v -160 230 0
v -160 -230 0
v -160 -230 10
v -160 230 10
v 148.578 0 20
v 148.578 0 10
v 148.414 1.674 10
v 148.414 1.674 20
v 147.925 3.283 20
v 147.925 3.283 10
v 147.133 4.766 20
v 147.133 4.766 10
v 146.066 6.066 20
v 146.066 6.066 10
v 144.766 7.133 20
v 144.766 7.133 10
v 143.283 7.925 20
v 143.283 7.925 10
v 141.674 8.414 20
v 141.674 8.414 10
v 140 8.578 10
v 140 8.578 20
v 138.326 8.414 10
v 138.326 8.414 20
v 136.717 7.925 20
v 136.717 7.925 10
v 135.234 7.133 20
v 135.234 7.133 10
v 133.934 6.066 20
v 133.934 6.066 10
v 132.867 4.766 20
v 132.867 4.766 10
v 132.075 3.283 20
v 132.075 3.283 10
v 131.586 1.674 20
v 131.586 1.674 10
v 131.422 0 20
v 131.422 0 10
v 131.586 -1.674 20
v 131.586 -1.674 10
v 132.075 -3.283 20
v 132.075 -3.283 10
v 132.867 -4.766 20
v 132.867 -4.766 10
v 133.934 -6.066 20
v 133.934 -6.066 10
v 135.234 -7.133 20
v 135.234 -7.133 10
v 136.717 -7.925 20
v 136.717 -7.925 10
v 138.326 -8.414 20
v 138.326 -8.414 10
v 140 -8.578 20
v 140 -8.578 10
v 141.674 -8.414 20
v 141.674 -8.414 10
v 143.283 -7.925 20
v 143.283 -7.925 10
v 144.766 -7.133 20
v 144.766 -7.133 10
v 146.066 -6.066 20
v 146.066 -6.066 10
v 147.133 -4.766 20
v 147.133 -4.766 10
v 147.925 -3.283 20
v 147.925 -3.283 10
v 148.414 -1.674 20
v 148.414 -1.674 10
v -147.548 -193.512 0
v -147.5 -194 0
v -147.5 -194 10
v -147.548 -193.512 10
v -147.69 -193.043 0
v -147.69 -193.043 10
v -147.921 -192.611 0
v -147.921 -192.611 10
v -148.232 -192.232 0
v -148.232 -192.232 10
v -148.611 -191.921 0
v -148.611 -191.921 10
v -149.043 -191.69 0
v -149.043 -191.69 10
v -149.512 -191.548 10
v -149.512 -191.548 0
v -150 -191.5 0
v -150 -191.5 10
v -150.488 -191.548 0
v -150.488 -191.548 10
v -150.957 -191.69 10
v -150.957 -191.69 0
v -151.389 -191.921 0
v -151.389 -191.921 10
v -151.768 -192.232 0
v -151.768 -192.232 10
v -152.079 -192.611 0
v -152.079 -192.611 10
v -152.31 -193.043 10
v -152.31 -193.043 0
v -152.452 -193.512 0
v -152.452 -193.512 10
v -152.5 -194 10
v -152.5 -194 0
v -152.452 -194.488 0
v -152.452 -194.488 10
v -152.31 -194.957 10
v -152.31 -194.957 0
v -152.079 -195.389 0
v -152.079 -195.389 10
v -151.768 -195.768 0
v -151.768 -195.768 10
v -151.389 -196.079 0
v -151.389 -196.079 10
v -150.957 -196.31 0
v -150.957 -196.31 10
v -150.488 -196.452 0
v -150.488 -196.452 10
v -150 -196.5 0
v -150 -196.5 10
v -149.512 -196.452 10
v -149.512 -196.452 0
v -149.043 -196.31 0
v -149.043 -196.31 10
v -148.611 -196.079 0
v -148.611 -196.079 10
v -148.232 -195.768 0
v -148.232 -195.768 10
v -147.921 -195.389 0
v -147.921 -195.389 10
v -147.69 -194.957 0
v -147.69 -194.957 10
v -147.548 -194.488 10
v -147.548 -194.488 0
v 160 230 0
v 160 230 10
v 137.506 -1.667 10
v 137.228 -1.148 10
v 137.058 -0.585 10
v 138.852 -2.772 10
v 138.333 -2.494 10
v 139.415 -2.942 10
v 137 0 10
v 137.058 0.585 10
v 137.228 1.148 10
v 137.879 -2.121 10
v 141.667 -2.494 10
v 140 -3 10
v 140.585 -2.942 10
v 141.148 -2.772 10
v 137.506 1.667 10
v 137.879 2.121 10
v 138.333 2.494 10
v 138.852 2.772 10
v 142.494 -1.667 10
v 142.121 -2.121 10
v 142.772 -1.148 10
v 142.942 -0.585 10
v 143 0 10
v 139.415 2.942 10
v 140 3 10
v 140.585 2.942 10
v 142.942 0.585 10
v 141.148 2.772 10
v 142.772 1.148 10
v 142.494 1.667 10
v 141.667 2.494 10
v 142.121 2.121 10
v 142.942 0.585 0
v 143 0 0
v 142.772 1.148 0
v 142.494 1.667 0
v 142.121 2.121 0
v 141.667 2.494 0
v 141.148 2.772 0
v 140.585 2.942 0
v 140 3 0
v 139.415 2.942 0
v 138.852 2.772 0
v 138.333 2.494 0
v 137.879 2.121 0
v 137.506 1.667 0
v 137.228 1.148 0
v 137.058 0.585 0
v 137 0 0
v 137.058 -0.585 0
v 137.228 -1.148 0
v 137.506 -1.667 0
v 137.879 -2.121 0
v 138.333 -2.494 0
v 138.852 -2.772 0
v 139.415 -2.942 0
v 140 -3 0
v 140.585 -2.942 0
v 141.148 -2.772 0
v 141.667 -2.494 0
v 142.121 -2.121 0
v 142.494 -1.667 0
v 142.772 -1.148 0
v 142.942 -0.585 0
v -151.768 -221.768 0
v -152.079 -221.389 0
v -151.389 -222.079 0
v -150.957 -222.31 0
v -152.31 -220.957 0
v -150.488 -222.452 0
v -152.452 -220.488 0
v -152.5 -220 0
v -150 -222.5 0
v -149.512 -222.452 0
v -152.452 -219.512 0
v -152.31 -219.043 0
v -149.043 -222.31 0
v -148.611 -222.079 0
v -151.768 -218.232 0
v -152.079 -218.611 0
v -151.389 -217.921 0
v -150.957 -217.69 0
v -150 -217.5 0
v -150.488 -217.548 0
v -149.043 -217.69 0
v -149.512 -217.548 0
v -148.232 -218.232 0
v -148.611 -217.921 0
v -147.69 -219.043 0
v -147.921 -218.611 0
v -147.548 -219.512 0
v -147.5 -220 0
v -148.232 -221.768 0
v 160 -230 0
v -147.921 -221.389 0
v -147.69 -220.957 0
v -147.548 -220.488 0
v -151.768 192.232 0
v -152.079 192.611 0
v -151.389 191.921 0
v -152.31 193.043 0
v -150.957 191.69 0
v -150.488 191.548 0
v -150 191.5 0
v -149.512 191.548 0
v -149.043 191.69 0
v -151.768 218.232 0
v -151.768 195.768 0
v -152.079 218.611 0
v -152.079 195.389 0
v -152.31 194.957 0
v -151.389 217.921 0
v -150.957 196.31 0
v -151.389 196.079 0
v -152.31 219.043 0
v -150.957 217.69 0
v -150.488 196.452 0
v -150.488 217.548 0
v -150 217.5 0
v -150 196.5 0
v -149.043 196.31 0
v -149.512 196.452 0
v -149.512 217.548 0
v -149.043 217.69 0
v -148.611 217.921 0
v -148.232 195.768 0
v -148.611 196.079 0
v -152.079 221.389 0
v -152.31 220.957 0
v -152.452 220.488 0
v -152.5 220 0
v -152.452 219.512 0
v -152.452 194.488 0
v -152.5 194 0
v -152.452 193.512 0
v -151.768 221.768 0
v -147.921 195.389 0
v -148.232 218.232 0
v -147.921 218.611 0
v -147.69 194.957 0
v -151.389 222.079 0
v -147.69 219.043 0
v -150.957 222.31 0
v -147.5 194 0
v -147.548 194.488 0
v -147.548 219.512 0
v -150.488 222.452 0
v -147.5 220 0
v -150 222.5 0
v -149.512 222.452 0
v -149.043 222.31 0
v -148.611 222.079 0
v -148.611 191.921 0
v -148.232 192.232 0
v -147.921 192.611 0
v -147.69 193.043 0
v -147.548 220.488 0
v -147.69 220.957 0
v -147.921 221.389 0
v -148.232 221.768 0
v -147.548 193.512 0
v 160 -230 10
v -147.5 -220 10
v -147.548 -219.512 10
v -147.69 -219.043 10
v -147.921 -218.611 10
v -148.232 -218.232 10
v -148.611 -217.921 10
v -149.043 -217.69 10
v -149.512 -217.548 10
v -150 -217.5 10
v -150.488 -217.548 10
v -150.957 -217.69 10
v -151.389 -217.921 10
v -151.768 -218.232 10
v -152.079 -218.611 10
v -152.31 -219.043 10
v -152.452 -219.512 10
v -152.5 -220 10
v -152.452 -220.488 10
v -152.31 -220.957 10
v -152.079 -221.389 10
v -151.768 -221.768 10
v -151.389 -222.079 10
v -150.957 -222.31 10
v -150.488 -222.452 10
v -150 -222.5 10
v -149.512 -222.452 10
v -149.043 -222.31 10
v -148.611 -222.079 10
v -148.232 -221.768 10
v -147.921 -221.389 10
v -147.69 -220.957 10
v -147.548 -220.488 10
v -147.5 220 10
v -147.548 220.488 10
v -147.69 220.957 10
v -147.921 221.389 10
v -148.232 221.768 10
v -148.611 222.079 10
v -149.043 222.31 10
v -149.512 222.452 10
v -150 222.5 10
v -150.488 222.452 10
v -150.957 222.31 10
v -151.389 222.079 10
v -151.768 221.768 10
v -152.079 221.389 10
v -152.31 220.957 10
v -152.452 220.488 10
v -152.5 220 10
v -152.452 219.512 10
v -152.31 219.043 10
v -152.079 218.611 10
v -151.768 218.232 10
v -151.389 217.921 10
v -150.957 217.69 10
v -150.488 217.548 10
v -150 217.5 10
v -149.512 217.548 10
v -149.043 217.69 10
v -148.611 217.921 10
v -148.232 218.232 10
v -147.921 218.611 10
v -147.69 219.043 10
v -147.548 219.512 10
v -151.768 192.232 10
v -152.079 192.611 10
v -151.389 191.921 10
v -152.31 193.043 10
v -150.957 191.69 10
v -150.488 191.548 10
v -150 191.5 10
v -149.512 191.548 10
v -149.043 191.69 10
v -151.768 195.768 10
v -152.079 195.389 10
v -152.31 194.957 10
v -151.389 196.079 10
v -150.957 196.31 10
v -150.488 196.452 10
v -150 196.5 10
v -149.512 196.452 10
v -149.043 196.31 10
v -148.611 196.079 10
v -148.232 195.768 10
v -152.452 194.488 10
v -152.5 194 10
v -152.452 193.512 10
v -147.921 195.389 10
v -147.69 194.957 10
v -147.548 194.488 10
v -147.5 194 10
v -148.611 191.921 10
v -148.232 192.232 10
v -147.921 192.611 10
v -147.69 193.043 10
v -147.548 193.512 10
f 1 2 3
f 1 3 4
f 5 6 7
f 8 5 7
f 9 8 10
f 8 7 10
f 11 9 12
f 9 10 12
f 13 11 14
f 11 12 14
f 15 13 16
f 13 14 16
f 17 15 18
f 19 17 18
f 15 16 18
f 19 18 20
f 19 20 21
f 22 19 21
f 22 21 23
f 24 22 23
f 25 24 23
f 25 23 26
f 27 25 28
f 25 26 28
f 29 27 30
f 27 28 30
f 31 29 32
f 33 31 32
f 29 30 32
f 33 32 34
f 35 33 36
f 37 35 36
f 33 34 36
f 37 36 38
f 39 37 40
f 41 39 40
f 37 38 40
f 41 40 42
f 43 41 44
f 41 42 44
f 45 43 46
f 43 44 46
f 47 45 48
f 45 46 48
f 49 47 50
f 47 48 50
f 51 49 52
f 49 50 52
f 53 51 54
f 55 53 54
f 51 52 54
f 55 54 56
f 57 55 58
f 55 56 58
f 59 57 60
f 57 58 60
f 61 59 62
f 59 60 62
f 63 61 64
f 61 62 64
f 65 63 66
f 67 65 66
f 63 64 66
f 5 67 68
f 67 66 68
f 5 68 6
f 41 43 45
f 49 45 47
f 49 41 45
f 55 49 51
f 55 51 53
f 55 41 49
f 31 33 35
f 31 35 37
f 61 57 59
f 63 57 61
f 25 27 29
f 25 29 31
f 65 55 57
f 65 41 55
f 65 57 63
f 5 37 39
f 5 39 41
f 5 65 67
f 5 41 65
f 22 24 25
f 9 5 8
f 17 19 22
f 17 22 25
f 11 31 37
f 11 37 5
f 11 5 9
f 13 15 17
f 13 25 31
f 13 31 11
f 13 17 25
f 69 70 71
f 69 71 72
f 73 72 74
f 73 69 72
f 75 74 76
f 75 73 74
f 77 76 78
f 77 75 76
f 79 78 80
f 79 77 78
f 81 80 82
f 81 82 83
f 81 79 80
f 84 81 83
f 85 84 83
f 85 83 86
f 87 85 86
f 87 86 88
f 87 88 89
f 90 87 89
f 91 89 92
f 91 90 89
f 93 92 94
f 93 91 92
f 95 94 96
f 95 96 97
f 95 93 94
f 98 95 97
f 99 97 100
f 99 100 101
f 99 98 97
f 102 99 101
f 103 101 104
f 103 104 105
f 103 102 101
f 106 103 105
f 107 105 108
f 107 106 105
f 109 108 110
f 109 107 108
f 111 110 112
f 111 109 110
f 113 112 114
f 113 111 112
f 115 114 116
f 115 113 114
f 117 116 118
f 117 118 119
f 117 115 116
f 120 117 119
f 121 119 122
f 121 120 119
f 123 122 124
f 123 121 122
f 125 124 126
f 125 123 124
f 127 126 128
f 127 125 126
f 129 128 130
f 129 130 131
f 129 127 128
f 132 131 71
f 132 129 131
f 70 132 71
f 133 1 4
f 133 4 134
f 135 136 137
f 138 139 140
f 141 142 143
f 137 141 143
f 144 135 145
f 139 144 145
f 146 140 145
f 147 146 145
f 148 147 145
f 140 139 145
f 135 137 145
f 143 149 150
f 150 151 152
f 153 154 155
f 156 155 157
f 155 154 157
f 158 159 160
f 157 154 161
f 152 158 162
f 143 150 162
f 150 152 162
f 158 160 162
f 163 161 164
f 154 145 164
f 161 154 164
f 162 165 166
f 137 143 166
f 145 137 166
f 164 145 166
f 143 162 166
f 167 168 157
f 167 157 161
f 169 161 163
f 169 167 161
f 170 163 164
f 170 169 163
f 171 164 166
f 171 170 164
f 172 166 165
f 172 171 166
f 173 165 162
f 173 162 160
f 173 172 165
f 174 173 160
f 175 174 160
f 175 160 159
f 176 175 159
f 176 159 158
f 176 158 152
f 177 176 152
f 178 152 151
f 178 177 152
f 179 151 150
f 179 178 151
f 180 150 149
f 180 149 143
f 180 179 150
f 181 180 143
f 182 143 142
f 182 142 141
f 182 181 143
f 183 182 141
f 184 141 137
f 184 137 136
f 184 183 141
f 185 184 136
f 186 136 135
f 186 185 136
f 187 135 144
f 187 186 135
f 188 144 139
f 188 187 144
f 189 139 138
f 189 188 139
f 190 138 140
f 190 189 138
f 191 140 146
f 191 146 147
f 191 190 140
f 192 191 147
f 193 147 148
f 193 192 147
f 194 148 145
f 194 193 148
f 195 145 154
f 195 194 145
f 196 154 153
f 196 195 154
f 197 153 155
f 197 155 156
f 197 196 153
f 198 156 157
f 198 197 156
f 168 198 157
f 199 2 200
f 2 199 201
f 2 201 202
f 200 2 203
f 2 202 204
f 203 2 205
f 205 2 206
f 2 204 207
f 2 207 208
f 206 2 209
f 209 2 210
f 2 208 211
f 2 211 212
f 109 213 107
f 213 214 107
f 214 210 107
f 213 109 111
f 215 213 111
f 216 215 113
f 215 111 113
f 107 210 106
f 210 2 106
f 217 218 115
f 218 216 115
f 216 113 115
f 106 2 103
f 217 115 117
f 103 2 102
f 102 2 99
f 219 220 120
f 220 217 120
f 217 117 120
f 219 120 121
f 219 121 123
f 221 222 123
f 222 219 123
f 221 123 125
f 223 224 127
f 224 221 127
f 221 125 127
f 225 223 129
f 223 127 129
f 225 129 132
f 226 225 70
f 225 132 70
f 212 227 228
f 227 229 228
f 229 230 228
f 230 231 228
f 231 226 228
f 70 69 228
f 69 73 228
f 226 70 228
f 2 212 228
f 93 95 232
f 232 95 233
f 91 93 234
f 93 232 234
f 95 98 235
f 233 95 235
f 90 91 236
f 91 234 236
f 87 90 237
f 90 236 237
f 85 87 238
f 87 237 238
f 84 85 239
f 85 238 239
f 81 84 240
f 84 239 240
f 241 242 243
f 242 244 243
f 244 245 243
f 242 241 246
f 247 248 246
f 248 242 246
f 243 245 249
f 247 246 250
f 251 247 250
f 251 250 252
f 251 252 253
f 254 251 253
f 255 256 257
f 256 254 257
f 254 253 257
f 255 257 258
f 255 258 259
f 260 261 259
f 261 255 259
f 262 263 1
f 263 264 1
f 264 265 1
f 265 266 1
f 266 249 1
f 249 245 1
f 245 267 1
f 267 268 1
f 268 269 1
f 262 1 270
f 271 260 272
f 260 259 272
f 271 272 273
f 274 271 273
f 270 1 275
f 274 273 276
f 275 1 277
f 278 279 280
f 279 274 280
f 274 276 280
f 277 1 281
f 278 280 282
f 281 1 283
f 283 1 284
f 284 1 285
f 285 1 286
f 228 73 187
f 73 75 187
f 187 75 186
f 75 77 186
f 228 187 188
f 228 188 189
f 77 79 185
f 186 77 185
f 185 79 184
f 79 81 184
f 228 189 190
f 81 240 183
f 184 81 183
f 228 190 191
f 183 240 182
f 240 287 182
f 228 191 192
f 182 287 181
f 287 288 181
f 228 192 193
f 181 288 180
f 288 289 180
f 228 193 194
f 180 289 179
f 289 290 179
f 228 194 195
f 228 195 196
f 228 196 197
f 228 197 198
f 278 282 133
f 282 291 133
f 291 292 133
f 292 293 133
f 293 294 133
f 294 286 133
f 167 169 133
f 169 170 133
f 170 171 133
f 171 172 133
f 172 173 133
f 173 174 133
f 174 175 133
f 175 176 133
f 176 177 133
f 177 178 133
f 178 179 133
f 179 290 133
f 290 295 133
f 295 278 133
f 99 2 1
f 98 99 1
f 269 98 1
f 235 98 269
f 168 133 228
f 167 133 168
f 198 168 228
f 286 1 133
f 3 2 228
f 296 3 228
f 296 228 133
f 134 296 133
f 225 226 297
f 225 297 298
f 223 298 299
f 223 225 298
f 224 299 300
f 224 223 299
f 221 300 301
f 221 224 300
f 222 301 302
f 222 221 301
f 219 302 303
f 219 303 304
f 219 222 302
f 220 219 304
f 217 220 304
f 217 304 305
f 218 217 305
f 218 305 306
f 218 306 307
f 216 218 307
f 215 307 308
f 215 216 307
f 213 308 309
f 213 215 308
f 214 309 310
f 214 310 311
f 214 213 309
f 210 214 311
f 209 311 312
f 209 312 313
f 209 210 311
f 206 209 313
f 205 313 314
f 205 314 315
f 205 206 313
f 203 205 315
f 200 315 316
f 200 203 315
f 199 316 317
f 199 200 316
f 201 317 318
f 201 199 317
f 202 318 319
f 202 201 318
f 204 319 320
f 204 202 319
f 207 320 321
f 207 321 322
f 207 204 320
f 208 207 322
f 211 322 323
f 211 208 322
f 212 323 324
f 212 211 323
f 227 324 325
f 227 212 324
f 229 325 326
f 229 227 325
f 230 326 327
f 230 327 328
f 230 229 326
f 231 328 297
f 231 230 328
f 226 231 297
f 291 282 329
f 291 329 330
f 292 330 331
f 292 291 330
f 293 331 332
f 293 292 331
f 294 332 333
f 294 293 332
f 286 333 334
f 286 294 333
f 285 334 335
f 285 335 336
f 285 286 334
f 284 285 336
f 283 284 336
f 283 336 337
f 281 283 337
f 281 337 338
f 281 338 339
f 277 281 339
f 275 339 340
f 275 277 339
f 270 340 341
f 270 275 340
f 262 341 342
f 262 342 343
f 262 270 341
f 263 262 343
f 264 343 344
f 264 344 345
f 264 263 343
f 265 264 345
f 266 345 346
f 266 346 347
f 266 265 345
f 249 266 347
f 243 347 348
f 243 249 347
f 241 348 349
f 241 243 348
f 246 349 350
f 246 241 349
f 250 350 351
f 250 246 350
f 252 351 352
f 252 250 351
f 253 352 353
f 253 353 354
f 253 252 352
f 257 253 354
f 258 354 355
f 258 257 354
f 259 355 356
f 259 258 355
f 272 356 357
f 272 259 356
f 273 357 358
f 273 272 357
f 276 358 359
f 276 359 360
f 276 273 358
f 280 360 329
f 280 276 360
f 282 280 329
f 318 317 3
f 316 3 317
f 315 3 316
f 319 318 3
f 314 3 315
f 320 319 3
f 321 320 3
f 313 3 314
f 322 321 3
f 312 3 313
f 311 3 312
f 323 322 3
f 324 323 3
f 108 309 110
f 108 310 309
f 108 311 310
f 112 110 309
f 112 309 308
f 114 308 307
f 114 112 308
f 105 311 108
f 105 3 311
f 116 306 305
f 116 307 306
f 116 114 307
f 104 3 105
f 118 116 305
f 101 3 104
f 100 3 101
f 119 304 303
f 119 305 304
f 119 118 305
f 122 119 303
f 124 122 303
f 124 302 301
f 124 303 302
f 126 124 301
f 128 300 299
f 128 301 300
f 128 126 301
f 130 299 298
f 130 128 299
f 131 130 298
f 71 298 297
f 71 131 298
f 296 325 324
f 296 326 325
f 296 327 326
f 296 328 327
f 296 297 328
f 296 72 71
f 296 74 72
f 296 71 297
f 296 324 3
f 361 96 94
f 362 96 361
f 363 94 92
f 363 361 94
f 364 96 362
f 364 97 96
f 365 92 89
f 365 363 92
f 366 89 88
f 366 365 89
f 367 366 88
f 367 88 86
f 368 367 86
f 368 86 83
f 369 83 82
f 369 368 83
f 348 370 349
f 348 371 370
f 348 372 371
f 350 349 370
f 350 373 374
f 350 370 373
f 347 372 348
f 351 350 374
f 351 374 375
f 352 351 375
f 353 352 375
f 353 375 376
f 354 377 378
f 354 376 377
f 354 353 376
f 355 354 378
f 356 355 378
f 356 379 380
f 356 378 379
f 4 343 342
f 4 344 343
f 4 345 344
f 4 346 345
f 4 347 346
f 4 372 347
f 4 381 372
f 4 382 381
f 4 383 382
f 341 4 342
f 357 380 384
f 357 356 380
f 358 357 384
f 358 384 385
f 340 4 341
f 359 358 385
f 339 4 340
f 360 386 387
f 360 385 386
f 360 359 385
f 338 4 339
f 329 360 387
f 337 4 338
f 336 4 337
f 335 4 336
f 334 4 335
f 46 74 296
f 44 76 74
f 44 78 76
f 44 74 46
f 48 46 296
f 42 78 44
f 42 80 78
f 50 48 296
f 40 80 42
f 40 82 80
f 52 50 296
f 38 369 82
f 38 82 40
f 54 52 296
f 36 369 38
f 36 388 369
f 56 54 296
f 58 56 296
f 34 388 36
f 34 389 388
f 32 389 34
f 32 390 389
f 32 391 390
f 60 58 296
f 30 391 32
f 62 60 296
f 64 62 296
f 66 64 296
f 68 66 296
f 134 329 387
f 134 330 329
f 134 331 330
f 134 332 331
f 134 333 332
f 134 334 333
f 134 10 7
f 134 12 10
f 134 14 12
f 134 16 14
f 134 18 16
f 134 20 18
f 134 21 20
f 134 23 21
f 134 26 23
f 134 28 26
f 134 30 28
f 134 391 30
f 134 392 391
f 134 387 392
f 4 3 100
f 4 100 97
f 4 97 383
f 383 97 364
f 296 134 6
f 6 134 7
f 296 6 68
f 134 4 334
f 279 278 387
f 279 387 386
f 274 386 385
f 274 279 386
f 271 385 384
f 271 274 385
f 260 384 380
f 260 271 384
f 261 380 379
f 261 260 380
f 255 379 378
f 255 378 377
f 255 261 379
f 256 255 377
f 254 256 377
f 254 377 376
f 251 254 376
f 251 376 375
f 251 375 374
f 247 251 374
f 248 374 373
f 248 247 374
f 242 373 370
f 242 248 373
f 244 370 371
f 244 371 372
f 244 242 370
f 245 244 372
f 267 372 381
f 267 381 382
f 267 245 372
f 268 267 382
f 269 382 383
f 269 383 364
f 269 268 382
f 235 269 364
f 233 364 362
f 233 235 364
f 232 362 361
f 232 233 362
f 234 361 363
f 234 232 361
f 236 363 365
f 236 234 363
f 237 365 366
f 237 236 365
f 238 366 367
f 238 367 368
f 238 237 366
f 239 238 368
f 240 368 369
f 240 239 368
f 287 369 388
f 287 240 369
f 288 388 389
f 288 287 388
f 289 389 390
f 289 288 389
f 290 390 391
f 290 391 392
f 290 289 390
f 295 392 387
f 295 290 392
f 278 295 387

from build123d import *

# Parameters (mm, degrees)
SKETCH1_W           = 320
SKETCH1_H           = 460
SKETCH1_R           = 2.5
SKETCH1_R_2         = 3
BOSS_EXTRUDE1_DEPTH = 10
SKETCH2_R           = 8.578403593
BOSS_EXTRUDE2_DEPTH = 10


with BuildPart() as part:
    # Sketch1 → Boss-Extrude1 (new body)
    with BuildSketch(Plane.XY):
        Rectangle(SKETCH1_W, SKETCH1_H)
        with Locations((-150, -220)):
            Circle(SKETCH1_R, mode=Mode.SUBTRACT)
        with Locations((-150, 220)):
            Circle(SKETCH1_R, mode=Mode.SUBTRACT)
        with Locations((140, 0)):
            Circle(SKETCH1_R_2, mode=Mode.SUBTRACT)
        with Locations((-150, -194)):
            Circle(SKETCH1_R, mode=Mode.SUBTRACT)
        with Locations((-150, 194)):
            Circle(SKETCH1_R, mode=Mode.SUBTRACT)
    extrude(amount=BOSS_EXTRUDE1_DEPTH)

    # Sketch2 → Boss-Extrude2 (add)
    with BuildSketch(Plane.XY.offset(10)):
        with Locations((140, 0)):
            Circle(SKETCH2_R)
    extrude(amount=BOSS_EXTRUDE2_DEPTH)


solid = part.part
